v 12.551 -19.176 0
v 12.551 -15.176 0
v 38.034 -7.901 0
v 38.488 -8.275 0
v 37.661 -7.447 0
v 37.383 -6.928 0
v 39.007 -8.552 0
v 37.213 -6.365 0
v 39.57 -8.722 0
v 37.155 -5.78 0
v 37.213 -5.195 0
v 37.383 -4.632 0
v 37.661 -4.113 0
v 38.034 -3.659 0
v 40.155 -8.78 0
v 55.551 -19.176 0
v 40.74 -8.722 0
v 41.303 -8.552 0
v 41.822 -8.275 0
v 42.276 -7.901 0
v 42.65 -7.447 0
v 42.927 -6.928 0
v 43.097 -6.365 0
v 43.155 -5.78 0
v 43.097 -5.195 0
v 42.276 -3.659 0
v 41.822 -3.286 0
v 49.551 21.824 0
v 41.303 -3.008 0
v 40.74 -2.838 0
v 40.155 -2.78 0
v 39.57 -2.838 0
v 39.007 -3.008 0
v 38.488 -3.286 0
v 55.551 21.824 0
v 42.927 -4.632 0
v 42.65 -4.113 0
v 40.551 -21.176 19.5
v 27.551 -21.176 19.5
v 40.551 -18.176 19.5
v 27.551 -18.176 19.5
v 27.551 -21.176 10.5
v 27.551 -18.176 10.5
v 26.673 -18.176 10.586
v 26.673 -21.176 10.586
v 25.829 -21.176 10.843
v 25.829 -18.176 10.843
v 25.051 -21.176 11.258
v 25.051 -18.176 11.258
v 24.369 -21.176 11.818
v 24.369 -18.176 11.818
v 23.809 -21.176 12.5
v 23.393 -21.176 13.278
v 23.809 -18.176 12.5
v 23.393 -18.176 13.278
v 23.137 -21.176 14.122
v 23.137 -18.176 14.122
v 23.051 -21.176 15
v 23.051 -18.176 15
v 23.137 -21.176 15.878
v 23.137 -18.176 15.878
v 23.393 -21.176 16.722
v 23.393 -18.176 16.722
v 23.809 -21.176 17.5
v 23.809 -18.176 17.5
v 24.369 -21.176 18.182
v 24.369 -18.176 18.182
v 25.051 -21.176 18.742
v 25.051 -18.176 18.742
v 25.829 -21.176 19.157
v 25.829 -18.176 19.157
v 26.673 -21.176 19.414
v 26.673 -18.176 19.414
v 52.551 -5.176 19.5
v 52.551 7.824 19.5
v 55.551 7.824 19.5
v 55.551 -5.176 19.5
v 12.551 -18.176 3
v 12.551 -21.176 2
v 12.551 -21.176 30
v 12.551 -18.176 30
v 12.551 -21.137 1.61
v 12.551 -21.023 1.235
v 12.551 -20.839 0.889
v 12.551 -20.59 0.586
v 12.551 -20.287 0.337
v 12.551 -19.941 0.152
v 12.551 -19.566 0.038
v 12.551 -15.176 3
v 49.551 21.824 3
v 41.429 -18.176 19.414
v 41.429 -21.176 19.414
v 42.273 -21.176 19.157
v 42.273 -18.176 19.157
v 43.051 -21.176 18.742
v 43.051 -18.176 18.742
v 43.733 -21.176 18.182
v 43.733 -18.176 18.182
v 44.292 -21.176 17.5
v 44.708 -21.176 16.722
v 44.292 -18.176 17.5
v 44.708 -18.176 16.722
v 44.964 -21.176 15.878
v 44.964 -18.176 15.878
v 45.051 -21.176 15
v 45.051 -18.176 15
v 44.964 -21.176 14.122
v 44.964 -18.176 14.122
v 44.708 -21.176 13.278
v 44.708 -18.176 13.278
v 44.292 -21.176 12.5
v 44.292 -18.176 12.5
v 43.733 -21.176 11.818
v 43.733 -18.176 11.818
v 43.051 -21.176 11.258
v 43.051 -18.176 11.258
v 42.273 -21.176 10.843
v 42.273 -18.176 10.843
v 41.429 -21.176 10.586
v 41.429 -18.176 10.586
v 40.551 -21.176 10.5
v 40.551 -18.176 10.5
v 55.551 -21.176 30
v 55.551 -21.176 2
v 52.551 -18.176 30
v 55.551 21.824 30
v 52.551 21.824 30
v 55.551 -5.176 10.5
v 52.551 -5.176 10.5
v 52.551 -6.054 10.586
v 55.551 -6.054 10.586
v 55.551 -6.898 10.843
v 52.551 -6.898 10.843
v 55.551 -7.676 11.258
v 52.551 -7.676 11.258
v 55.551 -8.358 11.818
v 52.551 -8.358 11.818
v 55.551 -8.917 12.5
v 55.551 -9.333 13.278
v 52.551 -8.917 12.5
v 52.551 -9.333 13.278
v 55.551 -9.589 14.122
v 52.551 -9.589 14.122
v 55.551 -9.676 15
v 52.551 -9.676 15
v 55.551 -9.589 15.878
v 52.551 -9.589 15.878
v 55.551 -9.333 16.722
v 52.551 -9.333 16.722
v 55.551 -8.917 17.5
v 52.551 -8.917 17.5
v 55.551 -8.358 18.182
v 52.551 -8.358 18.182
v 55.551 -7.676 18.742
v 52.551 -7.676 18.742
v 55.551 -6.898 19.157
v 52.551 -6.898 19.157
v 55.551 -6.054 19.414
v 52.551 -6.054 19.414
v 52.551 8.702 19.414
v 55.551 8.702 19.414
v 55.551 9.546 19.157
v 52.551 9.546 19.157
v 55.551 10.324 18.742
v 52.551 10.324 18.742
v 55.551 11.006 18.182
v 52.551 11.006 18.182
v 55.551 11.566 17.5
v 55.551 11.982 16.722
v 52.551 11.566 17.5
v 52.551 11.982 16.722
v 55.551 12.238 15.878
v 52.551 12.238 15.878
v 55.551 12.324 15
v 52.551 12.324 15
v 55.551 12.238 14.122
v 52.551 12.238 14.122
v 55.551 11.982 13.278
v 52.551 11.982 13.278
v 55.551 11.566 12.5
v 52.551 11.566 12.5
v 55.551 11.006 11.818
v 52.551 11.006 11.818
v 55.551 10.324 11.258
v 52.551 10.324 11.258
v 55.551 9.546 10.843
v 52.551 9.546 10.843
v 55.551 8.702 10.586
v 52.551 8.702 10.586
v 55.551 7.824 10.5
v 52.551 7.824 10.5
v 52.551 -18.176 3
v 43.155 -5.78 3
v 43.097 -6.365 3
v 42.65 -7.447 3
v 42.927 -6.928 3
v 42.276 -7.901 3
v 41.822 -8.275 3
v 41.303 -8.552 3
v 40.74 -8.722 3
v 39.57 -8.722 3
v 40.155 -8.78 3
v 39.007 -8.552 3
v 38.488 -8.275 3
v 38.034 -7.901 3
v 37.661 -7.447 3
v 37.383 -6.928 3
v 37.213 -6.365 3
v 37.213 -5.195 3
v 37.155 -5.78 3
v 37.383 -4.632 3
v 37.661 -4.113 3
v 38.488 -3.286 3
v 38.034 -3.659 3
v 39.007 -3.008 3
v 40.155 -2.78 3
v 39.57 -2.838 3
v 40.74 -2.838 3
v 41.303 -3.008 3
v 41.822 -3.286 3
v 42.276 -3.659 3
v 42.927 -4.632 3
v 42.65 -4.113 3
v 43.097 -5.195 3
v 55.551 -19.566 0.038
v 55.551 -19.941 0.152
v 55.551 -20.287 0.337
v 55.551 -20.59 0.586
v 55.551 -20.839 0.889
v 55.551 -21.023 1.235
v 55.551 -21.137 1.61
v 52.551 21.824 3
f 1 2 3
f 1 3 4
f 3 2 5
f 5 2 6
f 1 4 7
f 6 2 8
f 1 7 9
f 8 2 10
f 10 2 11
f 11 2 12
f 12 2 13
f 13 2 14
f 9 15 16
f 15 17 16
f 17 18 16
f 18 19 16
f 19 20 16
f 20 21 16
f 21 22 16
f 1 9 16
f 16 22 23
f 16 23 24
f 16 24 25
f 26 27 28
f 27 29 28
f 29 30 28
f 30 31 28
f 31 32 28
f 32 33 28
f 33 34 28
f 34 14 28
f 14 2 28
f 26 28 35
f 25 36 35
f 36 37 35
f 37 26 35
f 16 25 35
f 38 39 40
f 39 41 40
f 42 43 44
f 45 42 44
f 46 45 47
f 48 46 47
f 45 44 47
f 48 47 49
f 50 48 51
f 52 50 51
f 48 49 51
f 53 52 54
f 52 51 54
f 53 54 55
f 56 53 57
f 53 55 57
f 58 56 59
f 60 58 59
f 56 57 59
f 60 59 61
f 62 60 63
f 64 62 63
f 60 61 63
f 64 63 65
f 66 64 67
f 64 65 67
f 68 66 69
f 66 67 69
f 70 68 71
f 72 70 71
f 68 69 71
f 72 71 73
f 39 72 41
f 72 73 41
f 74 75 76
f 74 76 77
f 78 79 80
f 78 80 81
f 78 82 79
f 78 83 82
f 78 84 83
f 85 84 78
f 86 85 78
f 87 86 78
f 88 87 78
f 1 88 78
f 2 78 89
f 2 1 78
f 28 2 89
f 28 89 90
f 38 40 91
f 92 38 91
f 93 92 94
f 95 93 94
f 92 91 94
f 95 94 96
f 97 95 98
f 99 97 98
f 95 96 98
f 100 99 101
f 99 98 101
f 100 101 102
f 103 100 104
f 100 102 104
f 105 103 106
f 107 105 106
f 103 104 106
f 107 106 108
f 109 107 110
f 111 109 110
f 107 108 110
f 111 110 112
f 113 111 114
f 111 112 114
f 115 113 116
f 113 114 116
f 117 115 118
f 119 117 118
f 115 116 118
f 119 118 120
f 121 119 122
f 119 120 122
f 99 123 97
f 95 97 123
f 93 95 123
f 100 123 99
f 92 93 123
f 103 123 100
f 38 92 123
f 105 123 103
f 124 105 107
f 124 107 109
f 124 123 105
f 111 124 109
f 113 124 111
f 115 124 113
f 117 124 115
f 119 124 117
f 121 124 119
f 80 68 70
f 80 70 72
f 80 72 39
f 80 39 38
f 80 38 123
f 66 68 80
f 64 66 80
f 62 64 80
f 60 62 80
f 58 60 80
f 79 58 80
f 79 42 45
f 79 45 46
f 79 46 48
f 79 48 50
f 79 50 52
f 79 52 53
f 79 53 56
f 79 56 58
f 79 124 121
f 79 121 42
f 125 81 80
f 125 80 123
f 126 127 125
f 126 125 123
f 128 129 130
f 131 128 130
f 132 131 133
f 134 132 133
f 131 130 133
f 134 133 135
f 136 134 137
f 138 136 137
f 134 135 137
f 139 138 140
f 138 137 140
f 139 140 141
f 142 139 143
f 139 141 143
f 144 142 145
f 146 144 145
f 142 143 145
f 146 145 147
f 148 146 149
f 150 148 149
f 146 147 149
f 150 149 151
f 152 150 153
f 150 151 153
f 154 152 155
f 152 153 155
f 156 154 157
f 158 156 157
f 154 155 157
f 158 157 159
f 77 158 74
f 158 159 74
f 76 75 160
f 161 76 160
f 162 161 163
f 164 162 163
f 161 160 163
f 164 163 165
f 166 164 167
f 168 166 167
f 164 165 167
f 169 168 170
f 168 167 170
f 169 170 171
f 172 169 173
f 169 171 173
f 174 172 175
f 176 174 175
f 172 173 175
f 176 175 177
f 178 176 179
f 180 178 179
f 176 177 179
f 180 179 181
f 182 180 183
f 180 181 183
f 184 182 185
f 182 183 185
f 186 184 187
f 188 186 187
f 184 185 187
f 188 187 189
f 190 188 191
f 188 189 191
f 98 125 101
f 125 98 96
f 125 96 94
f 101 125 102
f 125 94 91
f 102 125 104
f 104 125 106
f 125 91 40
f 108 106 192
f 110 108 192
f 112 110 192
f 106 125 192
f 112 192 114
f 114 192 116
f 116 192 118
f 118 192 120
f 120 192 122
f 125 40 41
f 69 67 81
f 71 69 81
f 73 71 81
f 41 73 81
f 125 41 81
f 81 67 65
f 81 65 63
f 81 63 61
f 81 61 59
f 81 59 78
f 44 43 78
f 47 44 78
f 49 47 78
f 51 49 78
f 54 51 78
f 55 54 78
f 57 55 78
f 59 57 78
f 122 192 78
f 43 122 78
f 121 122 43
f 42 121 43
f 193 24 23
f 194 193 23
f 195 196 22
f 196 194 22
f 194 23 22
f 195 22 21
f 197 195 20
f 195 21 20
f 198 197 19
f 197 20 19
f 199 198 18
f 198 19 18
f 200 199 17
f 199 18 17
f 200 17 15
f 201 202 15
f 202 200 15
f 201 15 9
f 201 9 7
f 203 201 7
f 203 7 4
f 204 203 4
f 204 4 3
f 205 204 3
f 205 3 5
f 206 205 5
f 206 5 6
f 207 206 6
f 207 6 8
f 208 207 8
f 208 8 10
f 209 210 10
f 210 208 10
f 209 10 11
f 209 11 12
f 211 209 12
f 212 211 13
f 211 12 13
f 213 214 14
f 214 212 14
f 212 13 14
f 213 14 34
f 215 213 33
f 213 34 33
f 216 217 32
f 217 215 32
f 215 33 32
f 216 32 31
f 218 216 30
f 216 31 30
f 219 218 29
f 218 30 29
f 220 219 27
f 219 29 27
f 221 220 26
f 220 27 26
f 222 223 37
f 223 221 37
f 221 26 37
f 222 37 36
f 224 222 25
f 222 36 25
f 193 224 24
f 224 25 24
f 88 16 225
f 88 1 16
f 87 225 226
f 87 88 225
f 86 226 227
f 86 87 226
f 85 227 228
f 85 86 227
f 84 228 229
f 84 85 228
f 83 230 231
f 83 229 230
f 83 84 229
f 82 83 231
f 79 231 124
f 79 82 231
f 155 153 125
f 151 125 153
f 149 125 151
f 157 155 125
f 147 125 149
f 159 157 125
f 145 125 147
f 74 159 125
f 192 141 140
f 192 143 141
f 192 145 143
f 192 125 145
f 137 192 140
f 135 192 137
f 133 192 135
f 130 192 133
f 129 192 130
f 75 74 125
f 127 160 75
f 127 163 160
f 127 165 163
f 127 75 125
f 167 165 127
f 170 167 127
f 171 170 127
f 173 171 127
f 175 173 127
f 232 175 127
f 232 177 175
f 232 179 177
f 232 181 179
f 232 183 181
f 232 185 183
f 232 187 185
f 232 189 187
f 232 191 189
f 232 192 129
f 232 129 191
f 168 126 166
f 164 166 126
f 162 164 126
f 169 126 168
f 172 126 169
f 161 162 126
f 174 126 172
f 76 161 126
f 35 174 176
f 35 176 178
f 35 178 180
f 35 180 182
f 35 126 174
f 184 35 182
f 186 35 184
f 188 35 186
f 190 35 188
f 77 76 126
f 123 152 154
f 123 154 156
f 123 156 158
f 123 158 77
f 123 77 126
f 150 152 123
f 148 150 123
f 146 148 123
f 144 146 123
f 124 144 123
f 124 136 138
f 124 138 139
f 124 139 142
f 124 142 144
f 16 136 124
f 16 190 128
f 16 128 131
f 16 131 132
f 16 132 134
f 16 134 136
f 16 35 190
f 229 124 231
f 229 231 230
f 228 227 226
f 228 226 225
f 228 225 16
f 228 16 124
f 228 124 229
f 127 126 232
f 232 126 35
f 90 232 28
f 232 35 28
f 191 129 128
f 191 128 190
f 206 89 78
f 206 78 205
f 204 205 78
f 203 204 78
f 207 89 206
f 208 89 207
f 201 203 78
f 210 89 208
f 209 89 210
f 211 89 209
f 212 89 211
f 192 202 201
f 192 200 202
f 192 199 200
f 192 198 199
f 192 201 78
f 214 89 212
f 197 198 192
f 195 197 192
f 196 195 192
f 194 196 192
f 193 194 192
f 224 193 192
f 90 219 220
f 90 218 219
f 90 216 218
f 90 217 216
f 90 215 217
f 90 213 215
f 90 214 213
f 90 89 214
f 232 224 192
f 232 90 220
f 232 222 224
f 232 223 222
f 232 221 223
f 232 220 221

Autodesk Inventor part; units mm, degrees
ref_plane "YZ Plane" through (0, 0, 0) normal (1, 0, 0) x (0, 1, 0)
ref_plane "XZ Plane" through (0, 0, 0) normal (0, 1, 0) x (-1, 0, 0)
ref_plane "XY Plane" through (0, 0, 0) normal (0, 0, 1) x (1, 0, 0)
sketch "Boceto1" plane through (0, 0, 0) normal (0, 0, 1) x (1, 0, 0)
  line L0 (49.5506, 21.8243) -> (55.5506, 21.8243)
  line L1 (55.5506, 21.8243) -> (55.5506, -21.1757)
  line L2 (55.5506, -21.1757) -> (12.5506, -21.1757)
  line L3 (12.5506, -21.1757) -> (12.5506, -15.1757)
  line L4 (55.5506, 21.8243) -> (49.5506, 21.8243)
  line L5 (12.5506, -21.1757) -> (12.5506, -15.1757)
  line L6 (12.5506, -15.1757) -> (49.5506, 21.8243)
  circle A0 centre (40.1551, -5.7801) radius 3
  point P0 (0, 0)
  dimension "d0" = 43
  dimension "d1" = 43
  dimension "d2" = 6
  dimension "d3" = 6
  dimension "d4" = 6
extrude "Extrusión1" add sketch "Boceto1" along normal blind 3
sketch "Boceto2" plane through (0, 0, 3) normal (0, 0, 1) x (1, 0, 0)
  line L0 (12.5506, -15.1757) -> (12.5506, -21.1757) projected
  line L1 (55.5506, -21.1757) -> (55.5506, 21.8243) projected
  line L2 (12.5506, -21.1757) -> (55.5506, -21.1757)
  line L3 (55.5506, -21.1757) -> (55.5506, -18.1757)
  line L4 (55.5506, -18.1757) -> (12.5506, -18.1757)
  line L5 (12.5506, -18.1757) -> (12.5506, -21.1757)
  point P0 (0, 0)
  dimension "d7" = 3
extrude "Extrusión2" add sketch "Boceto2" along normal blind 27
sketch "Boceto3" plane through (0, 0, 3) normal (0, 0, 1) x (1, 0, 0)
  line L0 (12.5506, -18.1757) -> (55.5506, -18.1757) projected
  line L1 (55.5506, 21.8243) -> (49.5506, 21.8243) projected
  line L2 (55.5506, -18.1757) -> (52.5506, -18.1757)
  line L3 (52.5506, -18.1757) -> (52.5506, 21.8243)
  line L4 (52.5506, 21.8243) -> (55.5506, 21.8243)
  line L5 (55.5506, 21.8243) -> (55.5506, -18.1757)
  point P0 (0, 0)
extrude "Extrusión3" add sketch "Boceto3" along normal blind 27
fillet "Empalme1" radius 2 1 edges at (34.0506, -21.1757, 0)
sketch "Boceto4" plane through (52.5506, -18.1757, 3) normal (-1, 0, 0) x (0, 0, 1)
  line L0 (-3, 40) -> (27, 40) projected
  line L1 (27, 40) -> (12, 40)
  line L2 (-1, -3) -> (27, -3) projected
  line L3 (16.5, 26) -> (16.5, 13)
  line L4 (7.5, 13) -> (7.5, 26)
  line L5 (27, 40) -> (27, 0) projected
  arc A0 (16.5, 26) -> (7.5, 26) centre (12, 26) ccw
  arc A1 (7.5, 13) -> (16.5, 13) centre (12, 13) ccw
  point P0 (-3, 18.1757)
  dimension "d13" = 15
  dimension "d15" = 9
  dimension "d16" = 13
  dimension "d19" = 9
  dimension "d20" = 9
extrude "Extrusión4" cut sketch "Boceto4" against normal blind 3
sketch "Boceto5" plane through (12.5506, -18.1757, 30) normal (0, 1, 0) x (1, 0, 0)
  line L0 (0, 30) -> (0, 15)
  line L1 (0, 28) -> (0, 0) projected
  line L2 (43, 19.5) -> (43, 10.5) projected
  line L3 (15, 10.5) -> (28, 10.5)
  line L4 (28, 19.5) -> (15, 19.5)
  line L5 (37, 30) -> (0, 30) projected
  arc A0 (15, 19.5) -> (15, 10.5) centre (15, 15) ccw
  arc A1 (28, 10.5) -> (28, 19.5) centre (28, 15) ccw
  point P0 (-12.5506, 30)
  dimension "d23" = 15
  dimension "d28" = 19.5
extrude "Extrusión5" cut sketch "Boceto5" against normal blind 3
sketch "Boceto6" plane through (52.5506, -18.1757, 3) normal (-1, 0, 0) x (0, 0, 1)
  point P0 (-3, 18.1757)
properties part number "Sujetador2" material "Acero, galvanizado"
